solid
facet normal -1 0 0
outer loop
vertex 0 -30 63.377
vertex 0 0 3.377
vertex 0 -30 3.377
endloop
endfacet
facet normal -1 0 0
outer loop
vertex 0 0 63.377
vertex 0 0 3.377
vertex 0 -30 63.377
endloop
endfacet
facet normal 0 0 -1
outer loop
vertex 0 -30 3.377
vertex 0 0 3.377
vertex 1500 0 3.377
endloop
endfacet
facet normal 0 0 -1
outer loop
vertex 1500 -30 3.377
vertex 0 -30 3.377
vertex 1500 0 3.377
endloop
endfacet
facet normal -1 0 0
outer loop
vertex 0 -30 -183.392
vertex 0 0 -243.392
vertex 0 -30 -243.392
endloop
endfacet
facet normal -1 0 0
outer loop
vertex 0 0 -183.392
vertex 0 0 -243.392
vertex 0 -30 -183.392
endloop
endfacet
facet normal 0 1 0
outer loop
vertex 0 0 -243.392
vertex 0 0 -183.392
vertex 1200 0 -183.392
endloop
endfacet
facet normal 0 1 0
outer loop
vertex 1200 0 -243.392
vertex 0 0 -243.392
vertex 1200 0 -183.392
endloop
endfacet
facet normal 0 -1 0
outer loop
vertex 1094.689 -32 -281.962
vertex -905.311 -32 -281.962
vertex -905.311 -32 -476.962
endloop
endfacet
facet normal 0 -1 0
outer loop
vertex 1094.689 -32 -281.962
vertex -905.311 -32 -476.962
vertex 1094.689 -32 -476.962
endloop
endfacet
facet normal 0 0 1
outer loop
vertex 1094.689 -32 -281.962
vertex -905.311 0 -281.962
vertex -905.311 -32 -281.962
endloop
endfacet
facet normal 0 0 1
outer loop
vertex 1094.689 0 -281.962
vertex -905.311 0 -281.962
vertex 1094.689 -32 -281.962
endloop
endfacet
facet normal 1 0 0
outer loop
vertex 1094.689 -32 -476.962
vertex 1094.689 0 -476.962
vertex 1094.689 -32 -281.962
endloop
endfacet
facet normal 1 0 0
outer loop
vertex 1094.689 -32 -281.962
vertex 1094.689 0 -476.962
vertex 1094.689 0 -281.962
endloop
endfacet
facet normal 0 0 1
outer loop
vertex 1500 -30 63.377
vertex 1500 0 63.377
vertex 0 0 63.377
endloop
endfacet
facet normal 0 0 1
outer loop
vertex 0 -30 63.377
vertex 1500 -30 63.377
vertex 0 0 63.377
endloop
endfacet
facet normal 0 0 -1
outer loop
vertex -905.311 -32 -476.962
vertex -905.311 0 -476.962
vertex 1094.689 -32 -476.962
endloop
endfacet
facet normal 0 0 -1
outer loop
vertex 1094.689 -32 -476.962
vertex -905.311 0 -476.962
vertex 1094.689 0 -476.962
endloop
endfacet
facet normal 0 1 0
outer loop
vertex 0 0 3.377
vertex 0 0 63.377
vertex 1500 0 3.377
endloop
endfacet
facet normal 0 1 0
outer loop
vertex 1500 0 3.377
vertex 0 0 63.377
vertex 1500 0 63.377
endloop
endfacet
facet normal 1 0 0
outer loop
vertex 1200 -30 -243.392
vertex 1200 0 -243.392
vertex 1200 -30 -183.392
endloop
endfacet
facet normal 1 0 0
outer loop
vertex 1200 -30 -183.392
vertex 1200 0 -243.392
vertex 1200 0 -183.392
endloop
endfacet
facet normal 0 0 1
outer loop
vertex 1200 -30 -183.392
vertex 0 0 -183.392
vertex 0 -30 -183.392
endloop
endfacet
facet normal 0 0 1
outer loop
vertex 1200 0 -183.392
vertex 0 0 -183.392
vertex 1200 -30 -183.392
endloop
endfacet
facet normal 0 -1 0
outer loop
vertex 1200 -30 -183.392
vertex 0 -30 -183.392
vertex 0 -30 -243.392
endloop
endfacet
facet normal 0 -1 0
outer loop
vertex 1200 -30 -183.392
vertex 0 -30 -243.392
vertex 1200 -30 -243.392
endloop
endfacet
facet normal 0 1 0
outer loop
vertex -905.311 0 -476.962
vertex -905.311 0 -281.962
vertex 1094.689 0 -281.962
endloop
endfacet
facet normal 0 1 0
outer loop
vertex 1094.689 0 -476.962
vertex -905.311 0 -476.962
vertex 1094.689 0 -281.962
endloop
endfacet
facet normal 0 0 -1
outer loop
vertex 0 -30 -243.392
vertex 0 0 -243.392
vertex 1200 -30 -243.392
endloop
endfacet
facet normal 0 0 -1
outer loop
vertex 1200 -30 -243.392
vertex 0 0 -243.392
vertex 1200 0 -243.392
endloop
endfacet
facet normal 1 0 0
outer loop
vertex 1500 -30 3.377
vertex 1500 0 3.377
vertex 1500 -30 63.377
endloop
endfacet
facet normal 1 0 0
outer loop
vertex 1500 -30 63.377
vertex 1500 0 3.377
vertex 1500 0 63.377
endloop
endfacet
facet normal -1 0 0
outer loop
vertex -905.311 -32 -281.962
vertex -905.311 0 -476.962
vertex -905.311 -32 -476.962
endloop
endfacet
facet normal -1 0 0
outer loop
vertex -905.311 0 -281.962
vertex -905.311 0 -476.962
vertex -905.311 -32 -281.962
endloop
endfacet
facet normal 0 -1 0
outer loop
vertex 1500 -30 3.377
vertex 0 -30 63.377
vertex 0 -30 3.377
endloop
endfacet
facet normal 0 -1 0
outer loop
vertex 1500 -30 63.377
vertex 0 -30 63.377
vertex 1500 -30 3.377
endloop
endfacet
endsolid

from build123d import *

# Parameters (mm, degrees)
F0_W     = 300
F0_H     = 60
F0_W_2   = 1200
F1_DEPTH = 30
F2_W     = 1200
F2_H     = 60
F3_DEPTH = 30
F4_W     = 2000
F4_H     = 195
F5_DEPTH = 32


with BuildPart() as f1:
    # F0 (on Front) → F1 (new body)
    with BuildSketch(Plane.XZ):
        with Locations((150, 33.377474)):
            Rectangle(F0_W, F0_H)
        with Locations((900, 33.377474)):
            Rectangle(F0_W_2, F0_H)
    extrude(amount=F1_DEPTH)


with BuildPart() as f3:
    # F2 (on Front) → F3 (new body)
    with BuildSketch(Plane.XZ):
        with Locations((600, -213.39214)):
            Rectangle(F2_W, F2_H)
    extrude(amount=F3_DEPTH)


with BuildPart() as f5:
    # F4 (on Front) → F5 (new body)
    with BuildSketch(Plane.XZ):
        with Locations((94.689369, -379.461702)):
            Rectangle(F4_W, F4_H)
    extrude(amount=F5_DEPTH)


solid = Compound([f1.part, f3.part, f5.part])
